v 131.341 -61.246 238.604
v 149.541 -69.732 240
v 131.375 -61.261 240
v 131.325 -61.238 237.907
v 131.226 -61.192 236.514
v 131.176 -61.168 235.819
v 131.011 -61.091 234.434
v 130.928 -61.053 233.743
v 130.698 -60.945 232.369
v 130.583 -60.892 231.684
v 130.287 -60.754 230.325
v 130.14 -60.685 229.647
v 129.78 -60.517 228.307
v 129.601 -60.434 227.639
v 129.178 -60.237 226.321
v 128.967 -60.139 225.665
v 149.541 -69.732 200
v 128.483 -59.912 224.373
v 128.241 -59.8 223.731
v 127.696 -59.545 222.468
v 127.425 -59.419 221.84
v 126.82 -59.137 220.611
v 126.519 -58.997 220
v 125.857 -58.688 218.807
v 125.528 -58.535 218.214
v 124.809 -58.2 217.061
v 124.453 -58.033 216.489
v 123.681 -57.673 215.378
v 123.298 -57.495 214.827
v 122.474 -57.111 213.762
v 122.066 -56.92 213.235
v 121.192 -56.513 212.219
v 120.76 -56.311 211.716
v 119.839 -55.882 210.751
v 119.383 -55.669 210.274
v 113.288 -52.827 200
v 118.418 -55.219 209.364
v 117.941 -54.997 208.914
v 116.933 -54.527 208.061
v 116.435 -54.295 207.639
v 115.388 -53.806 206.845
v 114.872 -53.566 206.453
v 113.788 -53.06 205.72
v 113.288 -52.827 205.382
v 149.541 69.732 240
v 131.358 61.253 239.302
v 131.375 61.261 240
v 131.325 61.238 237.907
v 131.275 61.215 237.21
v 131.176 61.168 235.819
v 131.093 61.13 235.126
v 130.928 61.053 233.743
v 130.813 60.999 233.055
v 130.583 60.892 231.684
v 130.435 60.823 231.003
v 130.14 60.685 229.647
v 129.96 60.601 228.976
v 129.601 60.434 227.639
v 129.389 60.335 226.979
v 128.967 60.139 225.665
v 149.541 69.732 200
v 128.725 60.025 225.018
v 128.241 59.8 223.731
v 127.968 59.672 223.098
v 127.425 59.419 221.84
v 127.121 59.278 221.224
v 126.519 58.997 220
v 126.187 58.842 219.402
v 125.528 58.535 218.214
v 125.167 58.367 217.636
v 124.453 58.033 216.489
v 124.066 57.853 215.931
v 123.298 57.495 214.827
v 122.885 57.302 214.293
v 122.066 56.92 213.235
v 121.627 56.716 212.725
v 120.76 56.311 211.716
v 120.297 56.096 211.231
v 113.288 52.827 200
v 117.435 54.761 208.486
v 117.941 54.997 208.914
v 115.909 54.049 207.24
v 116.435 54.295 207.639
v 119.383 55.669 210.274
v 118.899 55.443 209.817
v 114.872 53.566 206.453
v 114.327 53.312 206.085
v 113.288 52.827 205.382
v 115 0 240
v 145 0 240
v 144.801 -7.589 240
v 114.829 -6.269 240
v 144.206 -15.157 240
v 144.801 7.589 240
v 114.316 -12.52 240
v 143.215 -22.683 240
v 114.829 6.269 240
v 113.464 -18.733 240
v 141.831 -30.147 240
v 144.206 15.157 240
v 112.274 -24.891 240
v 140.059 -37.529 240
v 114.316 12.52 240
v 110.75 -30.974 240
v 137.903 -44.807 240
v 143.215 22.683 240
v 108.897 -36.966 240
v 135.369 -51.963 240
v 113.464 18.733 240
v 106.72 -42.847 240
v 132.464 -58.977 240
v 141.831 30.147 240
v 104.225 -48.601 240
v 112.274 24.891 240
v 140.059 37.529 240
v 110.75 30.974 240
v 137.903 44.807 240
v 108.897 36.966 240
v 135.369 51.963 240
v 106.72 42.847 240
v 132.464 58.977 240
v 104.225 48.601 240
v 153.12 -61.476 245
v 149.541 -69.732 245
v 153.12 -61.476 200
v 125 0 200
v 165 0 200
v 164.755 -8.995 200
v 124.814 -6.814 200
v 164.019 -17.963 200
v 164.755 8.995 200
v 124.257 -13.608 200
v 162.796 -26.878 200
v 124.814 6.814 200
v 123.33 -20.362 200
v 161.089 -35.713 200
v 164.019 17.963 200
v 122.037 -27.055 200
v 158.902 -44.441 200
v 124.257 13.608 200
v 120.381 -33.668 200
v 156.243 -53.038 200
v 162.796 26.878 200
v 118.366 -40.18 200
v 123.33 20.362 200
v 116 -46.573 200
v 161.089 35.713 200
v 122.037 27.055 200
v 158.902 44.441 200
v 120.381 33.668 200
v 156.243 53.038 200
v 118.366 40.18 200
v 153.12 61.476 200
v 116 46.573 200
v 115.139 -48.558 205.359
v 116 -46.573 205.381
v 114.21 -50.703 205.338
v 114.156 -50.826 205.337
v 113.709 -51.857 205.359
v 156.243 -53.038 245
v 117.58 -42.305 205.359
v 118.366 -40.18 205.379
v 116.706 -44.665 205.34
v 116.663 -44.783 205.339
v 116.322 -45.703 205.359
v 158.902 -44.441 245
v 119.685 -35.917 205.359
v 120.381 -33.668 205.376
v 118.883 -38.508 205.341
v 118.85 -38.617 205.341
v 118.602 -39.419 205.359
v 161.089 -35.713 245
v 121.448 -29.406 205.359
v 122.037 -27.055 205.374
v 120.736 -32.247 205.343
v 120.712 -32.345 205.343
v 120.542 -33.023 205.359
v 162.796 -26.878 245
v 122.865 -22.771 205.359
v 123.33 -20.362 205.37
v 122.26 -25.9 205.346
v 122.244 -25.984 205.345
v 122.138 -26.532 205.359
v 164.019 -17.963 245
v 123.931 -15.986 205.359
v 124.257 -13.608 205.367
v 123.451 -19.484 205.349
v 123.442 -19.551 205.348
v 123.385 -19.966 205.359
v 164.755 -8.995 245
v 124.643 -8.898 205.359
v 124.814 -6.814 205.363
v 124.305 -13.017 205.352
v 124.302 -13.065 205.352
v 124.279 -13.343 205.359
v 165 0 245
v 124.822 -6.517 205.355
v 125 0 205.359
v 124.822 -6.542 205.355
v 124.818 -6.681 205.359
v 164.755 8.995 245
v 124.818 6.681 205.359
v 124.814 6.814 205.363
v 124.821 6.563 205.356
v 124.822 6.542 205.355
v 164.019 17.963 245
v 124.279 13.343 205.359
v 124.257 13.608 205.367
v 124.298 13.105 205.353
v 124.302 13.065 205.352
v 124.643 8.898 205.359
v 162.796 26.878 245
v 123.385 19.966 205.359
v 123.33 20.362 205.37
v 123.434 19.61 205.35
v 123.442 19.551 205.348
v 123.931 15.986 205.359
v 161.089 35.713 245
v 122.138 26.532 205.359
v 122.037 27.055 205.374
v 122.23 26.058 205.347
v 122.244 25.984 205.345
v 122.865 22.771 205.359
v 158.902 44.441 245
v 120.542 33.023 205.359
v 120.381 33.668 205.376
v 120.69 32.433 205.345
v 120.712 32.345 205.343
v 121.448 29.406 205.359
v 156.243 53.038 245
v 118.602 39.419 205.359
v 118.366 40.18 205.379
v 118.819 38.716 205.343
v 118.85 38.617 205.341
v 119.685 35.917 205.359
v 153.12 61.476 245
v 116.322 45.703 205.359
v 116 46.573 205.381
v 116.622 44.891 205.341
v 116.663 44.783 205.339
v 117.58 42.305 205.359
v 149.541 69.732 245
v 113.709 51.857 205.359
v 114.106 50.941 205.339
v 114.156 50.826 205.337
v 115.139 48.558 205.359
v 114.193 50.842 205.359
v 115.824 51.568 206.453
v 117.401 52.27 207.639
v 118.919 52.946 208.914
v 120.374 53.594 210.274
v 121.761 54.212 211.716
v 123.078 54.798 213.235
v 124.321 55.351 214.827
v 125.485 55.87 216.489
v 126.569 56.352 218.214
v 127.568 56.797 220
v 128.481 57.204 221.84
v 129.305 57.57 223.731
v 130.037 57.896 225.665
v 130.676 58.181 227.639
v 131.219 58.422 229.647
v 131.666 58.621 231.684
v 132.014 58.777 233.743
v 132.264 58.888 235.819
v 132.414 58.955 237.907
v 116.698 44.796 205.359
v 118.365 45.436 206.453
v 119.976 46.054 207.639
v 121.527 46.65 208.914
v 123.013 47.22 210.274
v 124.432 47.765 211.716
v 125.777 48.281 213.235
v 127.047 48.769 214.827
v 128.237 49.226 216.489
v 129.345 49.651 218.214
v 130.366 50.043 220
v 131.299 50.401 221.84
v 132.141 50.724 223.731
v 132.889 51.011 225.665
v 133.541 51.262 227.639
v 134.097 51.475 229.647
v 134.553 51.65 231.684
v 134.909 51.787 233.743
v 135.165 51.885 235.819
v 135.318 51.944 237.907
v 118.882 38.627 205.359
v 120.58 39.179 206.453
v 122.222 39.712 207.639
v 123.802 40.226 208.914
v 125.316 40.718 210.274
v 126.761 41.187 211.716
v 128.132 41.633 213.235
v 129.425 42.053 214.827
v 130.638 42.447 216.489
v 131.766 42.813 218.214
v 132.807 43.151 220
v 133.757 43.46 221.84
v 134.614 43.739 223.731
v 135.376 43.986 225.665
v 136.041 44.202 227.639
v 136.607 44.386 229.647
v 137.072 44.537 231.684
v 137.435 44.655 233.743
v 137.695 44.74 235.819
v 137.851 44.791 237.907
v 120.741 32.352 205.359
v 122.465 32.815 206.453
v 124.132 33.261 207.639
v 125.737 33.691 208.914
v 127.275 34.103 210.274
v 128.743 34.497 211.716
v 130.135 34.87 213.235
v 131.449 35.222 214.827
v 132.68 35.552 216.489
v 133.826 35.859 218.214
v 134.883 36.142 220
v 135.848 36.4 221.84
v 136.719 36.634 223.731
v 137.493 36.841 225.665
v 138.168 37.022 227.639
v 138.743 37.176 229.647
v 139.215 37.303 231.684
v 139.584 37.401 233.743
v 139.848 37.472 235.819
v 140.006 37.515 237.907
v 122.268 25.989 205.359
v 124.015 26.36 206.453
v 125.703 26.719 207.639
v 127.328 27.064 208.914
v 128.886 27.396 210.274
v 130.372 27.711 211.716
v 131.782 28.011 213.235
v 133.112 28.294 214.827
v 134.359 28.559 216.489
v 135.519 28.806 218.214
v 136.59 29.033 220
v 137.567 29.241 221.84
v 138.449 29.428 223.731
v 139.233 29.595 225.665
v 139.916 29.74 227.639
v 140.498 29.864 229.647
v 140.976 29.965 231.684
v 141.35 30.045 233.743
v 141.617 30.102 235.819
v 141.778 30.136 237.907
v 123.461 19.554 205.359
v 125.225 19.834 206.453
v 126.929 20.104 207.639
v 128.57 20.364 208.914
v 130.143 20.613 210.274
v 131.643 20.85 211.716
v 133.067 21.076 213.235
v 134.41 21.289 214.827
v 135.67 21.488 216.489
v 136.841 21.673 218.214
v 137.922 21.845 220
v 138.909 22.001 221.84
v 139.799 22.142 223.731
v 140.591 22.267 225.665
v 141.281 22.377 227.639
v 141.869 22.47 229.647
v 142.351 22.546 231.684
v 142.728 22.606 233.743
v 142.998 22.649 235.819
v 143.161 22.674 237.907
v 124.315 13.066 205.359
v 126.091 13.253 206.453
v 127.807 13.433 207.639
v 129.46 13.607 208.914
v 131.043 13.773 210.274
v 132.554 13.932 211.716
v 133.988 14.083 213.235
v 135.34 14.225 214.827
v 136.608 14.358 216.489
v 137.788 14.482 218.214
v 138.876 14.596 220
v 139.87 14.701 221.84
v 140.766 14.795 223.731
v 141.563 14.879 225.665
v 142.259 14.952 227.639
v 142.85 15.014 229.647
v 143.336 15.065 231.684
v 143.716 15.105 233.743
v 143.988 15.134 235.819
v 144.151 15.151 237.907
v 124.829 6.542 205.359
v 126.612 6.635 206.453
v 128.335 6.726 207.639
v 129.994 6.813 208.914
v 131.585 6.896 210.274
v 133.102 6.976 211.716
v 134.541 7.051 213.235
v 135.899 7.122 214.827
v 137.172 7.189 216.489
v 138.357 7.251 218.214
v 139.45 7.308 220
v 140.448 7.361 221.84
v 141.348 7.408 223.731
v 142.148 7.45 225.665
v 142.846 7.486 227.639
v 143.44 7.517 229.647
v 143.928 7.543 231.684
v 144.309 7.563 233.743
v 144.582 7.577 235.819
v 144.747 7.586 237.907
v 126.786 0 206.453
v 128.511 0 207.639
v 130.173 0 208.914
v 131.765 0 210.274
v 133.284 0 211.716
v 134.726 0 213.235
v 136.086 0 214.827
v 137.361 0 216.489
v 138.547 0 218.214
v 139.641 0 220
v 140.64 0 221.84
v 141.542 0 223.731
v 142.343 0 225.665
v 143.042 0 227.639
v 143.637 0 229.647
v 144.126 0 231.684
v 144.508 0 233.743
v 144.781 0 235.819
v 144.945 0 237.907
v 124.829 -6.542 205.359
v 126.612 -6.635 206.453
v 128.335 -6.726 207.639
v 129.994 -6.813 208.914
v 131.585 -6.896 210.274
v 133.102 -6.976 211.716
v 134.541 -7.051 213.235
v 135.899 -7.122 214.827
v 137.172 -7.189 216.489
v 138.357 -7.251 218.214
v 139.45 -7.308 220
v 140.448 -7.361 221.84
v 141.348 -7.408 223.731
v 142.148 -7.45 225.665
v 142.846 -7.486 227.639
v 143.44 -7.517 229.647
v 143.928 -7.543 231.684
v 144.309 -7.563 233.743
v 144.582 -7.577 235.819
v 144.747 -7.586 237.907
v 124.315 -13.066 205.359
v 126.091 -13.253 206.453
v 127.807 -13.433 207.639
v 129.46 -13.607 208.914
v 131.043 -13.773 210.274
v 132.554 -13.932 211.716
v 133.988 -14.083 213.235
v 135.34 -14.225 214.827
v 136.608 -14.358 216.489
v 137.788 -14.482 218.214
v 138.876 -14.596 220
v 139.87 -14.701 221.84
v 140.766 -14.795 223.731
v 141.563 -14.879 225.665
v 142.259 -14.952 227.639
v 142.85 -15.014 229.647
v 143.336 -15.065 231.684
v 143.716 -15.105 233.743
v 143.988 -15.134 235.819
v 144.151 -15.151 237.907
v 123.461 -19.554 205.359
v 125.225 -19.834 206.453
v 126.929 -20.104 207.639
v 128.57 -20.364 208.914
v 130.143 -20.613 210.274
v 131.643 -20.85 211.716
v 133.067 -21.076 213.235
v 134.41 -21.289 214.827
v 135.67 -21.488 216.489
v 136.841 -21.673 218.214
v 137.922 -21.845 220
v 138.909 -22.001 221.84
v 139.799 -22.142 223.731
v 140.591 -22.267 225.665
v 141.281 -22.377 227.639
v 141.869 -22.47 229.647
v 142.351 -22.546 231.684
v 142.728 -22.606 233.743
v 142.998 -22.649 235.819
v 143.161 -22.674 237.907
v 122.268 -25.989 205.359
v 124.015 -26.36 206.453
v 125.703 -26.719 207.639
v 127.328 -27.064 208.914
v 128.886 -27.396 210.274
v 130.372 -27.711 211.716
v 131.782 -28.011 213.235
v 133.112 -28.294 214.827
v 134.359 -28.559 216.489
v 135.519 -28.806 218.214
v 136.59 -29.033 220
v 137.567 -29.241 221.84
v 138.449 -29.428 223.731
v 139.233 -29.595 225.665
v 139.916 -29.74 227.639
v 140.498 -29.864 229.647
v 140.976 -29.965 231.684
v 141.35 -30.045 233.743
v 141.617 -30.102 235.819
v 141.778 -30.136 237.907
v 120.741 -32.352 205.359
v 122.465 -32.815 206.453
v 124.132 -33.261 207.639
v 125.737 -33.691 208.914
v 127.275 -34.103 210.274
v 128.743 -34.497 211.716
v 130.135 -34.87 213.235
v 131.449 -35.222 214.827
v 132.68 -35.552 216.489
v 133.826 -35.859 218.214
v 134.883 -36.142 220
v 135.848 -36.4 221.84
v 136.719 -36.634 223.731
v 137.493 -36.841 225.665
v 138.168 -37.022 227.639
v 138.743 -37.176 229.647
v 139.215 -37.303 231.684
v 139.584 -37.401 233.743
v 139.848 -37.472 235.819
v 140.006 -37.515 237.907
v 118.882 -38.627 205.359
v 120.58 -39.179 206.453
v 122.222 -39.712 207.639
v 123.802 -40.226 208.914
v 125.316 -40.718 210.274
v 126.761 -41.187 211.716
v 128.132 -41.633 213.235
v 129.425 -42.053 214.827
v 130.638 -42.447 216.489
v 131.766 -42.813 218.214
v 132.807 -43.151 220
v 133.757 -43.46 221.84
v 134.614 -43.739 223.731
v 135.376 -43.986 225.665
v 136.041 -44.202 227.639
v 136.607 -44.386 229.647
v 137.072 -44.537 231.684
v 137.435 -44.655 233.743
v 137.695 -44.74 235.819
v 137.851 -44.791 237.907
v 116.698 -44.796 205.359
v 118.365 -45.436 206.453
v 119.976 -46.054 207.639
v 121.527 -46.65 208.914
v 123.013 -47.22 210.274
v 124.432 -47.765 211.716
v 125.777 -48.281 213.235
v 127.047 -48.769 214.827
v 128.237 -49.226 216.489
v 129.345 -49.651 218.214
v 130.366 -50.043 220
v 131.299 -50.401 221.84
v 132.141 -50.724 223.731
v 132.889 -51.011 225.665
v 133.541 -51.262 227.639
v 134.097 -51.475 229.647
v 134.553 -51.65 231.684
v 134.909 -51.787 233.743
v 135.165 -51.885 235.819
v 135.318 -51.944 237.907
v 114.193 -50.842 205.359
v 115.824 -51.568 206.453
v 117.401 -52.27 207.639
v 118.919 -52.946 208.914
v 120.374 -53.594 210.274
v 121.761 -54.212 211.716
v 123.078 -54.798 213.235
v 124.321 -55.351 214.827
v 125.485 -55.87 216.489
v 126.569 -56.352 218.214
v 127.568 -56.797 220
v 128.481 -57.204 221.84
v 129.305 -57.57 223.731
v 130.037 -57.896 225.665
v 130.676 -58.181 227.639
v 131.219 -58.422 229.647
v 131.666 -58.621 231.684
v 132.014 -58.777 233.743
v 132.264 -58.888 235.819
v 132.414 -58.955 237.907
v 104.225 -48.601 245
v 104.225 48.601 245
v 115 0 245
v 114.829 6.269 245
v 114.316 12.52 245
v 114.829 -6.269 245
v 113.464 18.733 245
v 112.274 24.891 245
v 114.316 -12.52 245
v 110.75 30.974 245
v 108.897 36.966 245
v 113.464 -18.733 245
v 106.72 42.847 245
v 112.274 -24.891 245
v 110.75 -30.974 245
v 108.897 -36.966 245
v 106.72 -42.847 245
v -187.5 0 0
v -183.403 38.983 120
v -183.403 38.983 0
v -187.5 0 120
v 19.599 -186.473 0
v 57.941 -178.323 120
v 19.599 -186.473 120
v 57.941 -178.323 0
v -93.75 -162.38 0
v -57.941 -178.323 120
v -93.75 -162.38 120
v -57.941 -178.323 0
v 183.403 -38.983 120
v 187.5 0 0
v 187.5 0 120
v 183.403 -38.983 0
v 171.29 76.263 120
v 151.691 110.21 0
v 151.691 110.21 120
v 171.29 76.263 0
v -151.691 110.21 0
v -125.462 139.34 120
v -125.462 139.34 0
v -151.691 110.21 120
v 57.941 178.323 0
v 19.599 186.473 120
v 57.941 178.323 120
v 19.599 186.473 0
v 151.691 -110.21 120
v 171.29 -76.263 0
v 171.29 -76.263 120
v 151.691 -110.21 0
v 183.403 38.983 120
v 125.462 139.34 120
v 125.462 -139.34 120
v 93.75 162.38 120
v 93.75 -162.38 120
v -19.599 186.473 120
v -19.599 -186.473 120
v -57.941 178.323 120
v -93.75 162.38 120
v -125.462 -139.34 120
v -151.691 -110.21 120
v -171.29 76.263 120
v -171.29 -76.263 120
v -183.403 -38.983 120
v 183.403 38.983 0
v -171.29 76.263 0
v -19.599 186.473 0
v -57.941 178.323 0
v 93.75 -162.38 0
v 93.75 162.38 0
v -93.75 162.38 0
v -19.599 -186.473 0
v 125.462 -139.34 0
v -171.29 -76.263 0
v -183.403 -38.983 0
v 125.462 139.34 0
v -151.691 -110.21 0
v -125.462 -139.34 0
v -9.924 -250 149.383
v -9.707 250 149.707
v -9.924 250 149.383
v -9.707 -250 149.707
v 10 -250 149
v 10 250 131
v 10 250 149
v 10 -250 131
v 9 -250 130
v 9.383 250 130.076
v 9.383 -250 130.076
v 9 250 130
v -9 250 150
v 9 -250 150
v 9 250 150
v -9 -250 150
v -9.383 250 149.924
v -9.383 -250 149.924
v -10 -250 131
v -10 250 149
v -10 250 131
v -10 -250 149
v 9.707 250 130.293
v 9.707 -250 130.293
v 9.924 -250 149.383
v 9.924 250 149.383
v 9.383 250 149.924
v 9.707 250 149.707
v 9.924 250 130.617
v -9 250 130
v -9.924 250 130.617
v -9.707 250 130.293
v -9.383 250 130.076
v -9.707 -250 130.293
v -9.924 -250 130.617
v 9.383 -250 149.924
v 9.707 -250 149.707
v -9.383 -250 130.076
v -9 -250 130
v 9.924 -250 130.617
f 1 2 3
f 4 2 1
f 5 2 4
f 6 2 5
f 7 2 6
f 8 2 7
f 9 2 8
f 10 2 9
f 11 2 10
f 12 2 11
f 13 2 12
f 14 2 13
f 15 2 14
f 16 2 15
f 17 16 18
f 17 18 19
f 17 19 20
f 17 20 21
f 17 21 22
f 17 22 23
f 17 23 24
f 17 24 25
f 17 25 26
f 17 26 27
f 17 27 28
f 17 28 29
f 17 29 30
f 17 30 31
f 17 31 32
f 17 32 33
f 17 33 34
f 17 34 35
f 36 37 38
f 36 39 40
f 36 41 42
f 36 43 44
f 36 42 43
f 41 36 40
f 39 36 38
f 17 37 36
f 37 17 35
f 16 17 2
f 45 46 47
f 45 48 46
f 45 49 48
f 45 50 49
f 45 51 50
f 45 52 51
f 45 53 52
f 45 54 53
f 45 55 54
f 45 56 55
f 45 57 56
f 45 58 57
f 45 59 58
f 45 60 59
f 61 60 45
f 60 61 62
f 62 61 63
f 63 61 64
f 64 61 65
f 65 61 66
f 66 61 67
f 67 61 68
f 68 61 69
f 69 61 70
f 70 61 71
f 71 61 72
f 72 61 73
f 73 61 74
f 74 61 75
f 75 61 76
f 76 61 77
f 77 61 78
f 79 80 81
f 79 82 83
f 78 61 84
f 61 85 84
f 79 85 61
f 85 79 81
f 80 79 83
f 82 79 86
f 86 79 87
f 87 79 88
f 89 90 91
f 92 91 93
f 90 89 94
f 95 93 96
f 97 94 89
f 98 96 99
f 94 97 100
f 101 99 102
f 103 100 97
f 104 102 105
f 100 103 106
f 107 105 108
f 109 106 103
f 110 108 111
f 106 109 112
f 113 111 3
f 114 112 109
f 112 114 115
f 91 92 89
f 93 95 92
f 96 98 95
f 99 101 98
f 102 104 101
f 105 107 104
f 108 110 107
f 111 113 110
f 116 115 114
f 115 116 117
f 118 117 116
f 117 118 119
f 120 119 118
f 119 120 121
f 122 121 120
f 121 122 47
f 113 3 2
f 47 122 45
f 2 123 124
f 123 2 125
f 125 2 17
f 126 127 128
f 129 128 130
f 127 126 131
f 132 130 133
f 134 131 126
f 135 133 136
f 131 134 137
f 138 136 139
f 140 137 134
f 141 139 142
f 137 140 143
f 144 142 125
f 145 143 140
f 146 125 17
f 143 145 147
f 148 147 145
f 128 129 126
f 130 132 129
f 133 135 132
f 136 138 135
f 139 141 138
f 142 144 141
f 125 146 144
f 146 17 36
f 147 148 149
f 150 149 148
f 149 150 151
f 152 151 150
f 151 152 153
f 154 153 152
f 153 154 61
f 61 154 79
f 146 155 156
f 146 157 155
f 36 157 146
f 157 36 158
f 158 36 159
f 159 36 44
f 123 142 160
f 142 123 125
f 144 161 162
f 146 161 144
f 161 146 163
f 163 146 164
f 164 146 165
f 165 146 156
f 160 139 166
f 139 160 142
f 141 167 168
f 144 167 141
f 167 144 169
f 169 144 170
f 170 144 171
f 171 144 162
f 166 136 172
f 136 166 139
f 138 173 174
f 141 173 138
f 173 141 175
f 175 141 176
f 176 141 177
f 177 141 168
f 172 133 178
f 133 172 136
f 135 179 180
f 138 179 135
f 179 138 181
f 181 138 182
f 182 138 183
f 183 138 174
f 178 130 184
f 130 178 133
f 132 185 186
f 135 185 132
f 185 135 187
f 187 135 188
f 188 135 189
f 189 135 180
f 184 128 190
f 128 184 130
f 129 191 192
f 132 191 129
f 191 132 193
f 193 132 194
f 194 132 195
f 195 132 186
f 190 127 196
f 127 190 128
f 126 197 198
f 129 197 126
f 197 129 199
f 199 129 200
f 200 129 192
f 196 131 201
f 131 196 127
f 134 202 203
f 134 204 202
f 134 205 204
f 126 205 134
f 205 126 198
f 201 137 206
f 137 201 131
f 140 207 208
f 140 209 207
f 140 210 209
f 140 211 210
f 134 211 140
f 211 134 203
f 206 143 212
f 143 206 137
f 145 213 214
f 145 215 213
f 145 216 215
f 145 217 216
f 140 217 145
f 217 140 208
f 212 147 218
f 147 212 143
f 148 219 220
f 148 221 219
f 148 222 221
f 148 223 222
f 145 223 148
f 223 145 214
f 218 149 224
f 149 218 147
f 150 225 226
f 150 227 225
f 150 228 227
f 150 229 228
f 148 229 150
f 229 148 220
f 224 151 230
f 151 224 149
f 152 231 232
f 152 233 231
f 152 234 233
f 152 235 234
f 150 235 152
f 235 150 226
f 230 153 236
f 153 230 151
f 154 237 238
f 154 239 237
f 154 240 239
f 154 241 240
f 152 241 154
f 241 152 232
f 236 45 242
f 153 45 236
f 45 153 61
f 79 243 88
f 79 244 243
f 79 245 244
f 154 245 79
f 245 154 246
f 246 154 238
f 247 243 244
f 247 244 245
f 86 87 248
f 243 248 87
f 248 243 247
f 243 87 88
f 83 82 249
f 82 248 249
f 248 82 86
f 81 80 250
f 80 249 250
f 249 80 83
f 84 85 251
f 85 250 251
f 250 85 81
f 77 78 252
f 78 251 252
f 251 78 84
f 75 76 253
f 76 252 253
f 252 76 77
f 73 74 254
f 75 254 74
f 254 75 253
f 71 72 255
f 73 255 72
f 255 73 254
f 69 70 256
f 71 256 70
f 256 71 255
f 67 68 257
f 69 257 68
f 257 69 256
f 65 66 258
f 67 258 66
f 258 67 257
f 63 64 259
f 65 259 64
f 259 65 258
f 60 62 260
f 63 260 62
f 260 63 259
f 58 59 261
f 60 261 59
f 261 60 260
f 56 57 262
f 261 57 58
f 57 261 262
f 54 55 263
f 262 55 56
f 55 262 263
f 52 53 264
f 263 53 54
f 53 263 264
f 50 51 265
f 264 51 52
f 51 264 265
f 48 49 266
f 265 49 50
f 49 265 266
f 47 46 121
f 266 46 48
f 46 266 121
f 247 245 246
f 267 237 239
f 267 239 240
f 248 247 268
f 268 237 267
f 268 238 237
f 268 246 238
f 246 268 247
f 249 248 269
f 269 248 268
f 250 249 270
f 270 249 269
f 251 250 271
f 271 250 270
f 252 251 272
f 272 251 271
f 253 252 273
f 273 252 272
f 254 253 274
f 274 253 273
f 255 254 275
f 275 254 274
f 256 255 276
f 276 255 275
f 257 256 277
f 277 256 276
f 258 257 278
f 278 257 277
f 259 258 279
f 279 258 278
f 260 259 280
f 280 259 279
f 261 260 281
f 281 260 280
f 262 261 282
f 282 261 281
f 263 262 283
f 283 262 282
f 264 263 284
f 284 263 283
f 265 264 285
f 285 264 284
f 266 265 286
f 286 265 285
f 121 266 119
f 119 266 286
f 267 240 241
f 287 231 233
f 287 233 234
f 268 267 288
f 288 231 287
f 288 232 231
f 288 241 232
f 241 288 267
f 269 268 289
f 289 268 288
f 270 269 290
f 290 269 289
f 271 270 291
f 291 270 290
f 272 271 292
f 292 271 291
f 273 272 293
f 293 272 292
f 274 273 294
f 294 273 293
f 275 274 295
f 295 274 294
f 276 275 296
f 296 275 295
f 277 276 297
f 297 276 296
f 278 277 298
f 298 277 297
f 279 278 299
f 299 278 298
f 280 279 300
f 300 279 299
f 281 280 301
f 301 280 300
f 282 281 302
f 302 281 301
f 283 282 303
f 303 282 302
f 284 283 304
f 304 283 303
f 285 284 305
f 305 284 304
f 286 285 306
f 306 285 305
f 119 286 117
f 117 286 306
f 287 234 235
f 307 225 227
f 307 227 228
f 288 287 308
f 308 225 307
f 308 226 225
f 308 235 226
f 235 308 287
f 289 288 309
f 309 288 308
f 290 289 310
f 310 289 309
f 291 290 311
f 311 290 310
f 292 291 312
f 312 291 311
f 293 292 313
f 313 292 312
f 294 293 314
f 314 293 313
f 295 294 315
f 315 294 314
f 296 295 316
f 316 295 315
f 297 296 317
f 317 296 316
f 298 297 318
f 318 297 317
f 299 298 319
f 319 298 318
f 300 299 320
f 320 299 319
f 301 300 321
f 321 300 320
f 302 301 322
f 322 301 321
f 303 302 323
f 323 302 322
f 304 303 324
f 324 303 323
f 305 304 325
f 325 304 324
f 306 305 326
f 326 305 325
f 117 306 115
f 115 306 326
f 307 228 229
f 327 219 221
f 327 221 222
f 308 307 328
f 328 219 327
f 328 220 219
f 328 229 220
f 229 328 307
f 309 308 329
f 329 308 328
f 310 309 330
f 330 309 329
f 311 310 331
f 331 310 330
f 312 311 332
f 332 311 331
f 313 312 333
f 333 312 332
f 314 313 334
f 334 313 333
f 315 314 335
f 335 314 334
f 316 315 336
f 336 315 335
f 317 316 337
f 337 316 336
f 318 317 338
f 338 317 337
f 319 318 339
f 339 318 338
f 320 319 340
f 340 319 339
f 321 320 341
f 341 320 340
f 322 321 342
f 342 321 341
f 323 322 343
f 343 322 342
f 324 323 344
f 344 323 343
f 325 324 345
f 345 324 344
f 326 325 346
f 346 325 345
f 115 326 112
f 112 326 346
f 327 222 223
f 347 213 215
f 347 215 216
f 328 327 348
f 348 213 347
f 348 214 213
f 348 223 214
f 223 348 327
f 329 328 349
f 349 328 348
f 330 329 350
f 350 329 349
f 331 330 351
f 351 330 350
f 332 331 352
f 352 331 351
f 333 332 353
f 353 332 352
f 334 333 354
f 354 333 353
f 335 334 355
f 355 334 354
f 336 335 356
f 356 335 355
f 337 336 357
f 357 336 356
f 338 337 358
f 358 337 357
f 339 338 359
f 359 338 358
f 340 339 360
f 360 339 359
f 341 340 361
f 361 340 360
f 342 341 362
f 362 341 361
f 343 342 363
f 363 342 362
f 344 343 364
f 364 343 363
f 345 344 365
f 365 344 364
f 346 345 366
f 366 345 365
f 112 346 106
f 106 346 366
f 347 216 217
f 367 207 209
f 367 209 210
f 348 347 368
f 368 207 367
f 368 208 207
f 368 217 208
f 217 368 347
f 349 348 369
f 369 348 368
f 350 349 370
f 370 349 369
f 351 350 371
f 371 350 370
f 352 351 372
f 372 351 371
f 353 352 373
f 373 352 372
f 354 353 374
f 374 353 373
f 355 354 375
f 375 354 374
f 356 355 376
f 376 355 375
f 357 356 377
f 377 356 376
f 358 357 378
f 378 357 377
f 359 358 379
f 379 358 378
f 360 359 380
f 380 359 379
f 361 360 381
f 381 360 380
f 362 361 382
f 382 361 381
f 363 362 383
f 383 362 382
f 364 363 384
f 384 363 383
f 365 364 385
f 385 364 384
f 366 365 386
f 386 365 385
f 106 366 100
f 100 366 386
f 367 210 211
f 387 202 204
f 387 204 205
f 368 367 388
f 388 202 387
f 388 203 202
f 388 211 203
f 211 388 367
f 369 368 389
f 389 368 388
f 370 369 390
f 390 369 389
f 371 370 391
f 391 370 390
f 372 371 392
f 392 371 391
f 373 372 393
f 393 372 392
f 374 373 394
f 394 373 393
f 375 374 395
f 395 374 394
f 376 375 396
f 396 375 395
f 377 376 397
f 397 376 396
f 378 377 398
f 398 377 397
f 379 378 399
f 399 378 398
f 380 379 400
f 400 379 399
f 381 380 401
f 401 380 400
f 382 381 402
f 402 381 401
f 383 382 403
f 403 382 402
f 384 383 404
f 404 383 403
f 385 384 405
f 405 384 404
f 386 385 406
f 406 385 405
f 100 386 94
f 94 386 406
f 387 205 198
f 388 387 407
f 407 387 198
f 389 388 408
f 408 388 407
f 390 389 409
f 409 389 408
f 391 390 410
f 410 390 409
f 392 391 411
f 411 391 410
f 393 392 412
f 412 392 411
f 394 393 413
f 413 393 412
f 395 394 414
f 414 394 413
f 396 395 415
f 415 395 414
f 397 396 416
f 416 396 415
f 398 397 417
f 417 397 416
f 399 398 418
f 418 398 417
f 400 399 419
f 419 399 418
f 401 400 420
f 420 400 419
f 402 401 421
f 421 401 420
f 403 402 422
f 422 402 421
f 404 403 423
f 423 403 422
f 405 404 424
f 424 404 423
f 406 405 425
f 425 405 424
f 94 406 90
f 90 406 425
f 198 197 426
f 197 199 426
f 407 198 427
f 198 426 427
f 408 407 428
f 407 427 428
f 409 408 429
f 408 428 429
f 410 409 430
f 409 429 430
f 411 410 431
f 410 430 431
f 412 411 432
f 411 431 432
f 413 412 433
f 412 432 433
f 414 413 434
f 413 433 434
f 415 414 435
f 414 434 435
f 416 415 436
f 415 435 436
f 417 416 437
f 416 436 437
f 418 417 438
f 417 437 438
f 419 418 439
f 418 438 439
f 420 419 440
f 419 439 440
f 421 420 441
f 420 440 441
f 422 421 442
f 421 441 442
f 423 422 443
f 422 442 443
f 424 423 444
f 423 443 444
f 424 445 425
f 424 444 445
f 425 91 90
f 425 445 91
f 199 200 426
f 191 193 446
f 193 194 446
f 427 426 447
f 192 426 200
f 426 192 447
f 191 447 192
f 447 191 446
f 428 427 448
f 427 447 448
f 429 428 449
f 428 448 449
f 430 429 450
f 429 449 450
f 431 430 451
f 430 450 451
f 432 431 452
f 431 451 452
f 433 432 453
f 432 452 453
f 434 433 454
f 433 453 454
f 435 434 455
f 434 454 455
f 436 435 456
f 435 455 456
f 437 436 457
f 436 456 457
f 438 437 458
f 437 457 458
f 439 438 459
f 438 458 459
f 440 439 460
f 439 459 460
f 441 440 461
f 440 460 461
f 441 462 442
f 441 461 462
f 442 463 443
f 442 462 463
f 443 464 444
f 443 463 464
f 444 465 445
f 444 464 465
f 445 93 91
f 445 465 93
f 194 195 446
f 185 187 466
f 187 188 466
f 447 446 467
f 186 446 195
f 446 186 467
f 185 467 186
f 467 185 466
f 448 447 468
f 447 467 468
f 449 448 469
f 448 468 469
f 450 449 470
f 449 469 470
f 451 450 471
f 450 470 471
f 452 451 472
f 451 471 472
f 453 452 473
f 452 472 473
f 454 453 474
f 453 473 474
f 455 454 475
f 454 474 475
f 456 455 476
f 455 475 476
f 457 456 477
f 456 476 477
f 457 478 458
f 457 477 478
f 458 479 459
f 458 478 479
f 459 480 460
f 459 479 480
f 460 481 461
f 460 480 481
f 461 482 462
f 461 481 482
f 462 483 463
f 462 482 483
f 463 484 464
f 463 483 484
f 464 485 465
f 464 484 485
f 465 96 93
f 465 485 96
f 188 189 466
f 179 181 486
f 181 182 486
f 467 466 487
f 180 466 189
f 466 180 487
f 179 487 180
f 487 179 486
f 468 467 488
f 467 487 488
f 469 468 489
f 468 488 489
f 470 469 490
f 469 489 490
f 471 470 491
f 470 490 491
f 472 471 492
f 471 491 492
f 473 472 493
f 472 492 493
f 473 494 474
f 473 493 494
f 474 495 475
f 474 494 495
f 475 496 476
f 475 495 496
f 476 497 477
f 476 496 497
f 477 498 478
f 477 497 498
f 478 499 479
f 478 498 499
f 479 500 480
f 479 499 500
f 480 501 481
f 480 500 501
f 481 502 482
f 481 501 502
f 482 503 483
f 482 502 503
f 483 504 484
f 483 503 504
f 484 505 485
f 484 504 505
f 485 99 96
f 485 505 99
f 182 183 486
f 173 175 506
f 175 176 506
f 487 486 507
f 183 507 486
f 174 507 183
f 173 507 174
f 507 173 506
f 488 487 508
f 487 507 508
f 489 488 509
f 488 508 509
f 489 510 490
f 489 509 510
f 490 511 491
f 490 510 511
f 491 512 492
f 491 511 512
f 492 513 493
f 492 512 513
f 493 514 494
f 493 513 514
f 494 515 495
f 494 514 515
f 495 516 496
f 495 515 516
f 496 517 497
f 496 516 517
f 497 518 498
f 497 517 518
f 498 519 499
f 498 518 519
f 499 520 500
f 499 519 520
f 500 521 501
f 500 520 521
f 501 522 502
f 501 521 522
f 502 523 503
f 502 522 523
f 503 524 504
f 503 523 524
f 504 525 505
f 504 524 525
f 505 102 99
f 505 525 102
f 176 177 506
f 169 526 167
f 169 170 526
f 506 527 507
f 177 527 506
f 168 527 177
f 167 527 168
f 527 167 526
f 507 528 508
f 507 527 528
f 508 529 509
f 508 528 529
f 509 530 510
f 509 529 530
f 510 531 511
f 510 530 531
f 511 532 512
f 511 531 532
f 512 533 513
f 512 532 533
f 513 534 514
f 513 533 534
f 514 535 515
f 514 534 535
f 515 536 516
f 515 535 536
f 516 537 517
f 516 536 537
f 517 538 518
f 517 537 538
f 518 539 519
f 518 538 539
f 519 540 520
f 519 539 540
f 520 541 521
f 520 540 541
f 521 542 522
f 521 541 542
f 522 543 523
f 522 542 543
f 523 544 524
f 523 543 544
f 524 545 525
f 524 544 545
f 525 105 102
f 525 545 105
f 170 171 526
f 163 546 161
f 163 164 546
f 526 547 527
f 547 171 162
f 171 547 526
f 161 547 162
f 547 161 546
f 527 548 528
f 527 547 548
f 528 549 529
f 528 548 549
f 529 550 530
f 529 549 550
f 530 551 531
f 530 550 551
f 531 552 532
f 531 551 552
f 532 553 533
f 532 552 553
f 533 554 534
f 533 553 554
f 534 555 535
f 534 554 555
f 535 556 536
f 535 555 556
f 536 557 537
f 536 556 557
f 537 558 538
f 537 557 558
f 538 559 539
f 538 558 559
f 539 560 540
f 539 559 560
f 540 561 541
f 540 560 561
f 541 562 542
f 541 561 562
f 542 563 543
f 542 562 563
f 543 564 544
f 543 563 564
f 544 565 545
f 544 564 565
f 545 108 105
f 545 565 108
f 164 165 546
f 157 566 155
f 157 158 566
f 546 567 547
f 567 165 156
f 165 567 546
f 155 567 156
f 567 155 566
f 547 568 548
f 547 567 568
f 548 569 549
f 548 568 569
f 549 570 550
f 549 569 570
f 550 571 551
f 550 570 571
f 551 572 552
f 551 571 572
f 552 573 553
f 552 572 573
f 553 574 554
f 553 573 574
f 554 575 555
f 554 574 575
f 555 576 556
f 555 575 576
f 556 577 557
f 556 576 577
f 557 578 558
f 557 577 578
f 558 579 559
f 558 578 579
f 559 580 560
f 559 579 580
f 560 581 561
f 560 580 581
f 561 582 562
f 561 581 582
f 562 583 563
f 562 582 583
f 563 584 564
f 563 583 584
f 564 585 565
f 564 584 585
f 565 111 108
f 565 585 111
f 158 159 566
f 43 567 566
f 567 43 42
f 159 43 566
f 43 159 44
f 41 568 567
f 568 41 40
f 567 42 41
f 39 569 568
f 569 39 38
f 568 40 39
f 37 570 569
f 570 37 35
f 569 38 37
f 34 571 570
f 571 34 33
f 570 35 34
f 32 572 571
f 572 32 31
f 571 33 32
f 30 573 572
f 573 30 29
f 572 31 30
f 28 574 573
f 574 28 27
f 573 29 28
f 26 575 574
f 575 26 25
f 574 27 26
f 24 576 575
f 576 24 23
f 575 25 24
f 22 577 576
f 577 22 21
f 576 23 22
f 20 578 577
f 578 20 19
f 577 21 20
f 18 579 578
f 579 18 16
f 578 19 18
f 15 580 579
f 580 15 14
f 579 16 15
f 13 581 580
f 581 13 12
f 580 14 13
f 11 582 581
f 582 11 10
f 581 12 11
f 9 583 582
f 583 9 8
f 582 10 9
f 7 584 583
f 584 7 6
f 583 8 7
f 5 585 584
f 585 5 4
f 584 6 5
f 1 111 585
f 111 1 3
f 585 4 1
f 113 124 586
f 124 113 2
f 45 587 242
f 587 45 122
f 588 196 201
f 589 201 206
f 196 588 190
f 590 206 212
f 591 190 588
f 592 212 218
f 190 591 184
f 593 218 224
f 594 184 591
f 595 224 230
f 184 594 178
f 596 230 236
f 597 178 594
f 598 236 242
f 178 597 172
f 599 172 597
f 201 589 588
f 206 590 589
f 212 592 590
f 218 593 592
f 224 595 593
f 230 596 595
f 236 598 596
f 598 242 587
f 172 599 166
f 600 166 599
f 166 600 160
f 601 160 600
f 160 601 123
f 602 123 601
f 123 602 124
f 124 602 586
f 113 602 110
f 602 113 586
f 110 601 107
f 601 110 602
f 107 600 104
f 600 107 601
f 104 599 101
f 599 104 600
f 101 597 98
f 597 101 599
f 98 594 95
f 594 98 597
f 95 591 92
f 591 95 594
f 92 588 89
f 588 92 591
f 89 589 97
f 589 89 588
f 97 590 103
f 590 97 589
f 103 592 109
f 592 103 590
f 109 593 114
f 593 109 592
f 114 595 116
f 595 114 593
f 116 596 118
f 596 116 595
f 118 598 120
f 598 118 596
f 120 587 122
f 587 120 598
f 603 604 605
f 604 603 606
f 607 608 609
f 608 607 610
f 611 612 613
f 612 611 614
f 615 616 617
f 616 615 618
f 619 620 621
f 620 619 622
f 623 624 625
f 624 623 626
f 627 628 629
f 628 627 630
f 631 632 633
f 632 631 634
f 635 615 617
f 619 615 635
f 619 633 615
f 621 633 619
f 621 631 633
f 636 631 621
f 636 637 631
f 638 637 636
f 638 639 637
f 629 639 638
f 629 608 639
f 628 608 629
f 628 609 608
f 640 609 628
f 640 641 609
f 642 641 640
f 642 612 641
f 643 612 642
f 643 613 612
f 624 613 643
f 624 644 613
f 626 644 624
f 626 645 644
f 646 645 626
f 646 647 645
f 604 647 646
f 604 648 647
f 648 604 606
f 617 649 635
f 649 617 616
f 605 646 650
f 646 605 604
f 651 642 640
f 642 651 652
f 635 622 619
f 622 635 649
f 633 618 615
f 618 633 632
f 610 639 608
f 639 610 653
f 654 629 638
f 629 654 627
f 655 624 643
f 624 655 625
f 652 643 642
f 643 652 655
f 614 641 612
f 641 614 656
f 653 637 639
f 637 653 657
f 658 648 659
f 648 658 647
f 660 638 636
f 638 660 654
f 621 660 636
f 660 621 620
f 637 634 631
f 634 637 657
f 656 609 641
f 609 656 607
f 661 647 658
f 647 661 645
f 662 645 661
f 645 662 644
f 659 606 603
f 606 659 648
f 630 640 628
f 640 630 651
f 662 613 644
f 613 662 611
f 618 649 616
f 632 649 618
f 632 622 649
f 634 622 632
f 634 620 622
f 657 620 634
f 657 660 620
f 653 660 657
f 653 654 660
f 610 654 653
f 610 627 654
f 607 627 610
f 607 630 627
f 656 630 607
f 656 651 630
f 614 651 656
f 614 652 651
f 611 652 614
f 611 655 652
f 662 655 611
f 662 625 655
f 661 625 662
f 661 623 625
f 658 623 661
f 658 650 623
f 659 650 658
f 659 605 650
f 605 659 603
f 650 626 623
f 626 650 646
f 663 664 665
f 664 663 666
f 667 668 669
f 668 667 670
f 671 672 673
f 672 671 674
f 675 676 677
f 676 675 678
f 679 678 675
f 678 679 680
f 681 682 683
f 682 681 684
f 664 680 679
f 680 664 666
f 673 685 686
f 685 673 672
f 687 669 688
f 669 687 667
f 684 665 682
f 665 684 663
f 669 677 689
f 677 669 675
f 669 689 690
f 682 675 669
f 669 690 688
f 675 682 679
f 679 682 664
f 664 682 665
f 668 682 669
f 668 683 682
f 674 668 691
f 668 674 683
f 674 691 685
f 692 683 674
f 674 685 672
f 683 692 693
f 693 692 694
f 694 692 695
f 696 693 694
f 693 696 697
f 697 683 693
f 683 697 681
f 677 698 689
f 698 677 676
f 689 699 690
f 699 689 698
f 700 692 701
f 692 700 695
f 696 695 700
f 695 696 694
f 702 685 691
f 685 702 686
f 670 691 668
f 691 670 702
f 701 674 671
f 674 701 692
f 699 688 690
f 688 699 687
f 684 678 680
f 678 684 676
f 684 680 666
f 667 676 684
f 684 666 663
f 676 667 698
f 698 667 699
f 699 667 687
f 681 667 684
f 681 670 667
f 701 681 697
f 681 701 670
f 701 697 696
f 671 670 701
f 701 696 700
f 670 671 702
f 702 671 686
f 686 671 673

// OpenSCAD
slotWH=20;
slotAH=500;
slotBH=250;
drmDia=375;
drmH=120;
slotADist=200;

cylinder(d=drmDia, h=drmH);

//translate([slotADist/2,-slotAH/2,-slotWH/2])rotate([-90,0,0])rcube([slotWH,slotWH,slotAH],1);
//translate([-slotADist/2,-slotAH/2,-slotWH/2])rotate([-90,0,0])rcube([slotWH,slotWH,slotAH],1);
//translate([slotADist/2,-slotAH/2,slotWH/2+drmH])rotate([-90,0,0])rcube([slotWH,slotWH,slotAH],1);
//translate([-slotADist/2,-slotAH/2,slotWH/2+drmH])rotate([-90,0,0])rcube([slotWH,slotWH,slotAH],1);
//
//translate([slotBH/2,(drmDia/2+slotWH/2+5),-slotWH/2+drmH])rotate([0,-90,0])rcube([slotWH,slotWH,slotBH],1);
//translate([slotBH/2,-(drmDia/2+slotWH/2+5),-slotWH/2+drmH])rotate([0,-90,0])rcube([slotWH,slotWH,slotBH],1);

translate([0,-slotAH/2,slotWH/2+drmH+10])rotate([-90,0,0])rcube([slotWH,slotWH,slotAH],1);

translate([0,0,200])drmClmp();

module drmClmp(){
    $fa = 3;
    w=120;
    d=45;
    hA=40;
    hB=5;
    doW=250;
    angle=50;
    ovrSnr=10;
    
    difference(){
        //translate([0,-d/2, 0])rcube([w,d,hA],5);
        translate([0,0, 0])rotate([0,0,-angle/2])rotate_extrude(angle=angle)translate([doW/2,0, 0])square([hA,hA]);
        translate([0,0, hA])rotate_extrude()translate([doW/2-hA+20,0, 0])circle(d=hA*2);
    }
    translate([0,0, hA])rotate([0,0,-angle/2])rotate_extrude(angle=angle)translate([doW/2-ovrSnr,0, 0])square([hA+ovrSnr,hB]);
}

module rcube(size,radius){
  $fn=16;
  linear_extrude(height=size[2])
  if(radius>0){
  hull()
  {
      // place 4 circles in the corners, with the given radius
      translate([(-size[0]/2)+(radius), (-size[1]/2)+(radius), 0])
      circle(r=radius);

      translate([(size[0]/2)-(radius), (-size[1]/2)+(radius), 0])
      circle(r=radius);

      translate([(-size[0]/2)+(radius), (size[1]/2)-(radius), 0])
      circle(r=radius);

      translate([(size[0]/2)-(radius), (size[1]/2)-(radius), 0])
      circle(r=radius);
  }
  }
  if(radius==0){
    translate([0,0,size[2]/2])cube(size,center=true);
  }
}
